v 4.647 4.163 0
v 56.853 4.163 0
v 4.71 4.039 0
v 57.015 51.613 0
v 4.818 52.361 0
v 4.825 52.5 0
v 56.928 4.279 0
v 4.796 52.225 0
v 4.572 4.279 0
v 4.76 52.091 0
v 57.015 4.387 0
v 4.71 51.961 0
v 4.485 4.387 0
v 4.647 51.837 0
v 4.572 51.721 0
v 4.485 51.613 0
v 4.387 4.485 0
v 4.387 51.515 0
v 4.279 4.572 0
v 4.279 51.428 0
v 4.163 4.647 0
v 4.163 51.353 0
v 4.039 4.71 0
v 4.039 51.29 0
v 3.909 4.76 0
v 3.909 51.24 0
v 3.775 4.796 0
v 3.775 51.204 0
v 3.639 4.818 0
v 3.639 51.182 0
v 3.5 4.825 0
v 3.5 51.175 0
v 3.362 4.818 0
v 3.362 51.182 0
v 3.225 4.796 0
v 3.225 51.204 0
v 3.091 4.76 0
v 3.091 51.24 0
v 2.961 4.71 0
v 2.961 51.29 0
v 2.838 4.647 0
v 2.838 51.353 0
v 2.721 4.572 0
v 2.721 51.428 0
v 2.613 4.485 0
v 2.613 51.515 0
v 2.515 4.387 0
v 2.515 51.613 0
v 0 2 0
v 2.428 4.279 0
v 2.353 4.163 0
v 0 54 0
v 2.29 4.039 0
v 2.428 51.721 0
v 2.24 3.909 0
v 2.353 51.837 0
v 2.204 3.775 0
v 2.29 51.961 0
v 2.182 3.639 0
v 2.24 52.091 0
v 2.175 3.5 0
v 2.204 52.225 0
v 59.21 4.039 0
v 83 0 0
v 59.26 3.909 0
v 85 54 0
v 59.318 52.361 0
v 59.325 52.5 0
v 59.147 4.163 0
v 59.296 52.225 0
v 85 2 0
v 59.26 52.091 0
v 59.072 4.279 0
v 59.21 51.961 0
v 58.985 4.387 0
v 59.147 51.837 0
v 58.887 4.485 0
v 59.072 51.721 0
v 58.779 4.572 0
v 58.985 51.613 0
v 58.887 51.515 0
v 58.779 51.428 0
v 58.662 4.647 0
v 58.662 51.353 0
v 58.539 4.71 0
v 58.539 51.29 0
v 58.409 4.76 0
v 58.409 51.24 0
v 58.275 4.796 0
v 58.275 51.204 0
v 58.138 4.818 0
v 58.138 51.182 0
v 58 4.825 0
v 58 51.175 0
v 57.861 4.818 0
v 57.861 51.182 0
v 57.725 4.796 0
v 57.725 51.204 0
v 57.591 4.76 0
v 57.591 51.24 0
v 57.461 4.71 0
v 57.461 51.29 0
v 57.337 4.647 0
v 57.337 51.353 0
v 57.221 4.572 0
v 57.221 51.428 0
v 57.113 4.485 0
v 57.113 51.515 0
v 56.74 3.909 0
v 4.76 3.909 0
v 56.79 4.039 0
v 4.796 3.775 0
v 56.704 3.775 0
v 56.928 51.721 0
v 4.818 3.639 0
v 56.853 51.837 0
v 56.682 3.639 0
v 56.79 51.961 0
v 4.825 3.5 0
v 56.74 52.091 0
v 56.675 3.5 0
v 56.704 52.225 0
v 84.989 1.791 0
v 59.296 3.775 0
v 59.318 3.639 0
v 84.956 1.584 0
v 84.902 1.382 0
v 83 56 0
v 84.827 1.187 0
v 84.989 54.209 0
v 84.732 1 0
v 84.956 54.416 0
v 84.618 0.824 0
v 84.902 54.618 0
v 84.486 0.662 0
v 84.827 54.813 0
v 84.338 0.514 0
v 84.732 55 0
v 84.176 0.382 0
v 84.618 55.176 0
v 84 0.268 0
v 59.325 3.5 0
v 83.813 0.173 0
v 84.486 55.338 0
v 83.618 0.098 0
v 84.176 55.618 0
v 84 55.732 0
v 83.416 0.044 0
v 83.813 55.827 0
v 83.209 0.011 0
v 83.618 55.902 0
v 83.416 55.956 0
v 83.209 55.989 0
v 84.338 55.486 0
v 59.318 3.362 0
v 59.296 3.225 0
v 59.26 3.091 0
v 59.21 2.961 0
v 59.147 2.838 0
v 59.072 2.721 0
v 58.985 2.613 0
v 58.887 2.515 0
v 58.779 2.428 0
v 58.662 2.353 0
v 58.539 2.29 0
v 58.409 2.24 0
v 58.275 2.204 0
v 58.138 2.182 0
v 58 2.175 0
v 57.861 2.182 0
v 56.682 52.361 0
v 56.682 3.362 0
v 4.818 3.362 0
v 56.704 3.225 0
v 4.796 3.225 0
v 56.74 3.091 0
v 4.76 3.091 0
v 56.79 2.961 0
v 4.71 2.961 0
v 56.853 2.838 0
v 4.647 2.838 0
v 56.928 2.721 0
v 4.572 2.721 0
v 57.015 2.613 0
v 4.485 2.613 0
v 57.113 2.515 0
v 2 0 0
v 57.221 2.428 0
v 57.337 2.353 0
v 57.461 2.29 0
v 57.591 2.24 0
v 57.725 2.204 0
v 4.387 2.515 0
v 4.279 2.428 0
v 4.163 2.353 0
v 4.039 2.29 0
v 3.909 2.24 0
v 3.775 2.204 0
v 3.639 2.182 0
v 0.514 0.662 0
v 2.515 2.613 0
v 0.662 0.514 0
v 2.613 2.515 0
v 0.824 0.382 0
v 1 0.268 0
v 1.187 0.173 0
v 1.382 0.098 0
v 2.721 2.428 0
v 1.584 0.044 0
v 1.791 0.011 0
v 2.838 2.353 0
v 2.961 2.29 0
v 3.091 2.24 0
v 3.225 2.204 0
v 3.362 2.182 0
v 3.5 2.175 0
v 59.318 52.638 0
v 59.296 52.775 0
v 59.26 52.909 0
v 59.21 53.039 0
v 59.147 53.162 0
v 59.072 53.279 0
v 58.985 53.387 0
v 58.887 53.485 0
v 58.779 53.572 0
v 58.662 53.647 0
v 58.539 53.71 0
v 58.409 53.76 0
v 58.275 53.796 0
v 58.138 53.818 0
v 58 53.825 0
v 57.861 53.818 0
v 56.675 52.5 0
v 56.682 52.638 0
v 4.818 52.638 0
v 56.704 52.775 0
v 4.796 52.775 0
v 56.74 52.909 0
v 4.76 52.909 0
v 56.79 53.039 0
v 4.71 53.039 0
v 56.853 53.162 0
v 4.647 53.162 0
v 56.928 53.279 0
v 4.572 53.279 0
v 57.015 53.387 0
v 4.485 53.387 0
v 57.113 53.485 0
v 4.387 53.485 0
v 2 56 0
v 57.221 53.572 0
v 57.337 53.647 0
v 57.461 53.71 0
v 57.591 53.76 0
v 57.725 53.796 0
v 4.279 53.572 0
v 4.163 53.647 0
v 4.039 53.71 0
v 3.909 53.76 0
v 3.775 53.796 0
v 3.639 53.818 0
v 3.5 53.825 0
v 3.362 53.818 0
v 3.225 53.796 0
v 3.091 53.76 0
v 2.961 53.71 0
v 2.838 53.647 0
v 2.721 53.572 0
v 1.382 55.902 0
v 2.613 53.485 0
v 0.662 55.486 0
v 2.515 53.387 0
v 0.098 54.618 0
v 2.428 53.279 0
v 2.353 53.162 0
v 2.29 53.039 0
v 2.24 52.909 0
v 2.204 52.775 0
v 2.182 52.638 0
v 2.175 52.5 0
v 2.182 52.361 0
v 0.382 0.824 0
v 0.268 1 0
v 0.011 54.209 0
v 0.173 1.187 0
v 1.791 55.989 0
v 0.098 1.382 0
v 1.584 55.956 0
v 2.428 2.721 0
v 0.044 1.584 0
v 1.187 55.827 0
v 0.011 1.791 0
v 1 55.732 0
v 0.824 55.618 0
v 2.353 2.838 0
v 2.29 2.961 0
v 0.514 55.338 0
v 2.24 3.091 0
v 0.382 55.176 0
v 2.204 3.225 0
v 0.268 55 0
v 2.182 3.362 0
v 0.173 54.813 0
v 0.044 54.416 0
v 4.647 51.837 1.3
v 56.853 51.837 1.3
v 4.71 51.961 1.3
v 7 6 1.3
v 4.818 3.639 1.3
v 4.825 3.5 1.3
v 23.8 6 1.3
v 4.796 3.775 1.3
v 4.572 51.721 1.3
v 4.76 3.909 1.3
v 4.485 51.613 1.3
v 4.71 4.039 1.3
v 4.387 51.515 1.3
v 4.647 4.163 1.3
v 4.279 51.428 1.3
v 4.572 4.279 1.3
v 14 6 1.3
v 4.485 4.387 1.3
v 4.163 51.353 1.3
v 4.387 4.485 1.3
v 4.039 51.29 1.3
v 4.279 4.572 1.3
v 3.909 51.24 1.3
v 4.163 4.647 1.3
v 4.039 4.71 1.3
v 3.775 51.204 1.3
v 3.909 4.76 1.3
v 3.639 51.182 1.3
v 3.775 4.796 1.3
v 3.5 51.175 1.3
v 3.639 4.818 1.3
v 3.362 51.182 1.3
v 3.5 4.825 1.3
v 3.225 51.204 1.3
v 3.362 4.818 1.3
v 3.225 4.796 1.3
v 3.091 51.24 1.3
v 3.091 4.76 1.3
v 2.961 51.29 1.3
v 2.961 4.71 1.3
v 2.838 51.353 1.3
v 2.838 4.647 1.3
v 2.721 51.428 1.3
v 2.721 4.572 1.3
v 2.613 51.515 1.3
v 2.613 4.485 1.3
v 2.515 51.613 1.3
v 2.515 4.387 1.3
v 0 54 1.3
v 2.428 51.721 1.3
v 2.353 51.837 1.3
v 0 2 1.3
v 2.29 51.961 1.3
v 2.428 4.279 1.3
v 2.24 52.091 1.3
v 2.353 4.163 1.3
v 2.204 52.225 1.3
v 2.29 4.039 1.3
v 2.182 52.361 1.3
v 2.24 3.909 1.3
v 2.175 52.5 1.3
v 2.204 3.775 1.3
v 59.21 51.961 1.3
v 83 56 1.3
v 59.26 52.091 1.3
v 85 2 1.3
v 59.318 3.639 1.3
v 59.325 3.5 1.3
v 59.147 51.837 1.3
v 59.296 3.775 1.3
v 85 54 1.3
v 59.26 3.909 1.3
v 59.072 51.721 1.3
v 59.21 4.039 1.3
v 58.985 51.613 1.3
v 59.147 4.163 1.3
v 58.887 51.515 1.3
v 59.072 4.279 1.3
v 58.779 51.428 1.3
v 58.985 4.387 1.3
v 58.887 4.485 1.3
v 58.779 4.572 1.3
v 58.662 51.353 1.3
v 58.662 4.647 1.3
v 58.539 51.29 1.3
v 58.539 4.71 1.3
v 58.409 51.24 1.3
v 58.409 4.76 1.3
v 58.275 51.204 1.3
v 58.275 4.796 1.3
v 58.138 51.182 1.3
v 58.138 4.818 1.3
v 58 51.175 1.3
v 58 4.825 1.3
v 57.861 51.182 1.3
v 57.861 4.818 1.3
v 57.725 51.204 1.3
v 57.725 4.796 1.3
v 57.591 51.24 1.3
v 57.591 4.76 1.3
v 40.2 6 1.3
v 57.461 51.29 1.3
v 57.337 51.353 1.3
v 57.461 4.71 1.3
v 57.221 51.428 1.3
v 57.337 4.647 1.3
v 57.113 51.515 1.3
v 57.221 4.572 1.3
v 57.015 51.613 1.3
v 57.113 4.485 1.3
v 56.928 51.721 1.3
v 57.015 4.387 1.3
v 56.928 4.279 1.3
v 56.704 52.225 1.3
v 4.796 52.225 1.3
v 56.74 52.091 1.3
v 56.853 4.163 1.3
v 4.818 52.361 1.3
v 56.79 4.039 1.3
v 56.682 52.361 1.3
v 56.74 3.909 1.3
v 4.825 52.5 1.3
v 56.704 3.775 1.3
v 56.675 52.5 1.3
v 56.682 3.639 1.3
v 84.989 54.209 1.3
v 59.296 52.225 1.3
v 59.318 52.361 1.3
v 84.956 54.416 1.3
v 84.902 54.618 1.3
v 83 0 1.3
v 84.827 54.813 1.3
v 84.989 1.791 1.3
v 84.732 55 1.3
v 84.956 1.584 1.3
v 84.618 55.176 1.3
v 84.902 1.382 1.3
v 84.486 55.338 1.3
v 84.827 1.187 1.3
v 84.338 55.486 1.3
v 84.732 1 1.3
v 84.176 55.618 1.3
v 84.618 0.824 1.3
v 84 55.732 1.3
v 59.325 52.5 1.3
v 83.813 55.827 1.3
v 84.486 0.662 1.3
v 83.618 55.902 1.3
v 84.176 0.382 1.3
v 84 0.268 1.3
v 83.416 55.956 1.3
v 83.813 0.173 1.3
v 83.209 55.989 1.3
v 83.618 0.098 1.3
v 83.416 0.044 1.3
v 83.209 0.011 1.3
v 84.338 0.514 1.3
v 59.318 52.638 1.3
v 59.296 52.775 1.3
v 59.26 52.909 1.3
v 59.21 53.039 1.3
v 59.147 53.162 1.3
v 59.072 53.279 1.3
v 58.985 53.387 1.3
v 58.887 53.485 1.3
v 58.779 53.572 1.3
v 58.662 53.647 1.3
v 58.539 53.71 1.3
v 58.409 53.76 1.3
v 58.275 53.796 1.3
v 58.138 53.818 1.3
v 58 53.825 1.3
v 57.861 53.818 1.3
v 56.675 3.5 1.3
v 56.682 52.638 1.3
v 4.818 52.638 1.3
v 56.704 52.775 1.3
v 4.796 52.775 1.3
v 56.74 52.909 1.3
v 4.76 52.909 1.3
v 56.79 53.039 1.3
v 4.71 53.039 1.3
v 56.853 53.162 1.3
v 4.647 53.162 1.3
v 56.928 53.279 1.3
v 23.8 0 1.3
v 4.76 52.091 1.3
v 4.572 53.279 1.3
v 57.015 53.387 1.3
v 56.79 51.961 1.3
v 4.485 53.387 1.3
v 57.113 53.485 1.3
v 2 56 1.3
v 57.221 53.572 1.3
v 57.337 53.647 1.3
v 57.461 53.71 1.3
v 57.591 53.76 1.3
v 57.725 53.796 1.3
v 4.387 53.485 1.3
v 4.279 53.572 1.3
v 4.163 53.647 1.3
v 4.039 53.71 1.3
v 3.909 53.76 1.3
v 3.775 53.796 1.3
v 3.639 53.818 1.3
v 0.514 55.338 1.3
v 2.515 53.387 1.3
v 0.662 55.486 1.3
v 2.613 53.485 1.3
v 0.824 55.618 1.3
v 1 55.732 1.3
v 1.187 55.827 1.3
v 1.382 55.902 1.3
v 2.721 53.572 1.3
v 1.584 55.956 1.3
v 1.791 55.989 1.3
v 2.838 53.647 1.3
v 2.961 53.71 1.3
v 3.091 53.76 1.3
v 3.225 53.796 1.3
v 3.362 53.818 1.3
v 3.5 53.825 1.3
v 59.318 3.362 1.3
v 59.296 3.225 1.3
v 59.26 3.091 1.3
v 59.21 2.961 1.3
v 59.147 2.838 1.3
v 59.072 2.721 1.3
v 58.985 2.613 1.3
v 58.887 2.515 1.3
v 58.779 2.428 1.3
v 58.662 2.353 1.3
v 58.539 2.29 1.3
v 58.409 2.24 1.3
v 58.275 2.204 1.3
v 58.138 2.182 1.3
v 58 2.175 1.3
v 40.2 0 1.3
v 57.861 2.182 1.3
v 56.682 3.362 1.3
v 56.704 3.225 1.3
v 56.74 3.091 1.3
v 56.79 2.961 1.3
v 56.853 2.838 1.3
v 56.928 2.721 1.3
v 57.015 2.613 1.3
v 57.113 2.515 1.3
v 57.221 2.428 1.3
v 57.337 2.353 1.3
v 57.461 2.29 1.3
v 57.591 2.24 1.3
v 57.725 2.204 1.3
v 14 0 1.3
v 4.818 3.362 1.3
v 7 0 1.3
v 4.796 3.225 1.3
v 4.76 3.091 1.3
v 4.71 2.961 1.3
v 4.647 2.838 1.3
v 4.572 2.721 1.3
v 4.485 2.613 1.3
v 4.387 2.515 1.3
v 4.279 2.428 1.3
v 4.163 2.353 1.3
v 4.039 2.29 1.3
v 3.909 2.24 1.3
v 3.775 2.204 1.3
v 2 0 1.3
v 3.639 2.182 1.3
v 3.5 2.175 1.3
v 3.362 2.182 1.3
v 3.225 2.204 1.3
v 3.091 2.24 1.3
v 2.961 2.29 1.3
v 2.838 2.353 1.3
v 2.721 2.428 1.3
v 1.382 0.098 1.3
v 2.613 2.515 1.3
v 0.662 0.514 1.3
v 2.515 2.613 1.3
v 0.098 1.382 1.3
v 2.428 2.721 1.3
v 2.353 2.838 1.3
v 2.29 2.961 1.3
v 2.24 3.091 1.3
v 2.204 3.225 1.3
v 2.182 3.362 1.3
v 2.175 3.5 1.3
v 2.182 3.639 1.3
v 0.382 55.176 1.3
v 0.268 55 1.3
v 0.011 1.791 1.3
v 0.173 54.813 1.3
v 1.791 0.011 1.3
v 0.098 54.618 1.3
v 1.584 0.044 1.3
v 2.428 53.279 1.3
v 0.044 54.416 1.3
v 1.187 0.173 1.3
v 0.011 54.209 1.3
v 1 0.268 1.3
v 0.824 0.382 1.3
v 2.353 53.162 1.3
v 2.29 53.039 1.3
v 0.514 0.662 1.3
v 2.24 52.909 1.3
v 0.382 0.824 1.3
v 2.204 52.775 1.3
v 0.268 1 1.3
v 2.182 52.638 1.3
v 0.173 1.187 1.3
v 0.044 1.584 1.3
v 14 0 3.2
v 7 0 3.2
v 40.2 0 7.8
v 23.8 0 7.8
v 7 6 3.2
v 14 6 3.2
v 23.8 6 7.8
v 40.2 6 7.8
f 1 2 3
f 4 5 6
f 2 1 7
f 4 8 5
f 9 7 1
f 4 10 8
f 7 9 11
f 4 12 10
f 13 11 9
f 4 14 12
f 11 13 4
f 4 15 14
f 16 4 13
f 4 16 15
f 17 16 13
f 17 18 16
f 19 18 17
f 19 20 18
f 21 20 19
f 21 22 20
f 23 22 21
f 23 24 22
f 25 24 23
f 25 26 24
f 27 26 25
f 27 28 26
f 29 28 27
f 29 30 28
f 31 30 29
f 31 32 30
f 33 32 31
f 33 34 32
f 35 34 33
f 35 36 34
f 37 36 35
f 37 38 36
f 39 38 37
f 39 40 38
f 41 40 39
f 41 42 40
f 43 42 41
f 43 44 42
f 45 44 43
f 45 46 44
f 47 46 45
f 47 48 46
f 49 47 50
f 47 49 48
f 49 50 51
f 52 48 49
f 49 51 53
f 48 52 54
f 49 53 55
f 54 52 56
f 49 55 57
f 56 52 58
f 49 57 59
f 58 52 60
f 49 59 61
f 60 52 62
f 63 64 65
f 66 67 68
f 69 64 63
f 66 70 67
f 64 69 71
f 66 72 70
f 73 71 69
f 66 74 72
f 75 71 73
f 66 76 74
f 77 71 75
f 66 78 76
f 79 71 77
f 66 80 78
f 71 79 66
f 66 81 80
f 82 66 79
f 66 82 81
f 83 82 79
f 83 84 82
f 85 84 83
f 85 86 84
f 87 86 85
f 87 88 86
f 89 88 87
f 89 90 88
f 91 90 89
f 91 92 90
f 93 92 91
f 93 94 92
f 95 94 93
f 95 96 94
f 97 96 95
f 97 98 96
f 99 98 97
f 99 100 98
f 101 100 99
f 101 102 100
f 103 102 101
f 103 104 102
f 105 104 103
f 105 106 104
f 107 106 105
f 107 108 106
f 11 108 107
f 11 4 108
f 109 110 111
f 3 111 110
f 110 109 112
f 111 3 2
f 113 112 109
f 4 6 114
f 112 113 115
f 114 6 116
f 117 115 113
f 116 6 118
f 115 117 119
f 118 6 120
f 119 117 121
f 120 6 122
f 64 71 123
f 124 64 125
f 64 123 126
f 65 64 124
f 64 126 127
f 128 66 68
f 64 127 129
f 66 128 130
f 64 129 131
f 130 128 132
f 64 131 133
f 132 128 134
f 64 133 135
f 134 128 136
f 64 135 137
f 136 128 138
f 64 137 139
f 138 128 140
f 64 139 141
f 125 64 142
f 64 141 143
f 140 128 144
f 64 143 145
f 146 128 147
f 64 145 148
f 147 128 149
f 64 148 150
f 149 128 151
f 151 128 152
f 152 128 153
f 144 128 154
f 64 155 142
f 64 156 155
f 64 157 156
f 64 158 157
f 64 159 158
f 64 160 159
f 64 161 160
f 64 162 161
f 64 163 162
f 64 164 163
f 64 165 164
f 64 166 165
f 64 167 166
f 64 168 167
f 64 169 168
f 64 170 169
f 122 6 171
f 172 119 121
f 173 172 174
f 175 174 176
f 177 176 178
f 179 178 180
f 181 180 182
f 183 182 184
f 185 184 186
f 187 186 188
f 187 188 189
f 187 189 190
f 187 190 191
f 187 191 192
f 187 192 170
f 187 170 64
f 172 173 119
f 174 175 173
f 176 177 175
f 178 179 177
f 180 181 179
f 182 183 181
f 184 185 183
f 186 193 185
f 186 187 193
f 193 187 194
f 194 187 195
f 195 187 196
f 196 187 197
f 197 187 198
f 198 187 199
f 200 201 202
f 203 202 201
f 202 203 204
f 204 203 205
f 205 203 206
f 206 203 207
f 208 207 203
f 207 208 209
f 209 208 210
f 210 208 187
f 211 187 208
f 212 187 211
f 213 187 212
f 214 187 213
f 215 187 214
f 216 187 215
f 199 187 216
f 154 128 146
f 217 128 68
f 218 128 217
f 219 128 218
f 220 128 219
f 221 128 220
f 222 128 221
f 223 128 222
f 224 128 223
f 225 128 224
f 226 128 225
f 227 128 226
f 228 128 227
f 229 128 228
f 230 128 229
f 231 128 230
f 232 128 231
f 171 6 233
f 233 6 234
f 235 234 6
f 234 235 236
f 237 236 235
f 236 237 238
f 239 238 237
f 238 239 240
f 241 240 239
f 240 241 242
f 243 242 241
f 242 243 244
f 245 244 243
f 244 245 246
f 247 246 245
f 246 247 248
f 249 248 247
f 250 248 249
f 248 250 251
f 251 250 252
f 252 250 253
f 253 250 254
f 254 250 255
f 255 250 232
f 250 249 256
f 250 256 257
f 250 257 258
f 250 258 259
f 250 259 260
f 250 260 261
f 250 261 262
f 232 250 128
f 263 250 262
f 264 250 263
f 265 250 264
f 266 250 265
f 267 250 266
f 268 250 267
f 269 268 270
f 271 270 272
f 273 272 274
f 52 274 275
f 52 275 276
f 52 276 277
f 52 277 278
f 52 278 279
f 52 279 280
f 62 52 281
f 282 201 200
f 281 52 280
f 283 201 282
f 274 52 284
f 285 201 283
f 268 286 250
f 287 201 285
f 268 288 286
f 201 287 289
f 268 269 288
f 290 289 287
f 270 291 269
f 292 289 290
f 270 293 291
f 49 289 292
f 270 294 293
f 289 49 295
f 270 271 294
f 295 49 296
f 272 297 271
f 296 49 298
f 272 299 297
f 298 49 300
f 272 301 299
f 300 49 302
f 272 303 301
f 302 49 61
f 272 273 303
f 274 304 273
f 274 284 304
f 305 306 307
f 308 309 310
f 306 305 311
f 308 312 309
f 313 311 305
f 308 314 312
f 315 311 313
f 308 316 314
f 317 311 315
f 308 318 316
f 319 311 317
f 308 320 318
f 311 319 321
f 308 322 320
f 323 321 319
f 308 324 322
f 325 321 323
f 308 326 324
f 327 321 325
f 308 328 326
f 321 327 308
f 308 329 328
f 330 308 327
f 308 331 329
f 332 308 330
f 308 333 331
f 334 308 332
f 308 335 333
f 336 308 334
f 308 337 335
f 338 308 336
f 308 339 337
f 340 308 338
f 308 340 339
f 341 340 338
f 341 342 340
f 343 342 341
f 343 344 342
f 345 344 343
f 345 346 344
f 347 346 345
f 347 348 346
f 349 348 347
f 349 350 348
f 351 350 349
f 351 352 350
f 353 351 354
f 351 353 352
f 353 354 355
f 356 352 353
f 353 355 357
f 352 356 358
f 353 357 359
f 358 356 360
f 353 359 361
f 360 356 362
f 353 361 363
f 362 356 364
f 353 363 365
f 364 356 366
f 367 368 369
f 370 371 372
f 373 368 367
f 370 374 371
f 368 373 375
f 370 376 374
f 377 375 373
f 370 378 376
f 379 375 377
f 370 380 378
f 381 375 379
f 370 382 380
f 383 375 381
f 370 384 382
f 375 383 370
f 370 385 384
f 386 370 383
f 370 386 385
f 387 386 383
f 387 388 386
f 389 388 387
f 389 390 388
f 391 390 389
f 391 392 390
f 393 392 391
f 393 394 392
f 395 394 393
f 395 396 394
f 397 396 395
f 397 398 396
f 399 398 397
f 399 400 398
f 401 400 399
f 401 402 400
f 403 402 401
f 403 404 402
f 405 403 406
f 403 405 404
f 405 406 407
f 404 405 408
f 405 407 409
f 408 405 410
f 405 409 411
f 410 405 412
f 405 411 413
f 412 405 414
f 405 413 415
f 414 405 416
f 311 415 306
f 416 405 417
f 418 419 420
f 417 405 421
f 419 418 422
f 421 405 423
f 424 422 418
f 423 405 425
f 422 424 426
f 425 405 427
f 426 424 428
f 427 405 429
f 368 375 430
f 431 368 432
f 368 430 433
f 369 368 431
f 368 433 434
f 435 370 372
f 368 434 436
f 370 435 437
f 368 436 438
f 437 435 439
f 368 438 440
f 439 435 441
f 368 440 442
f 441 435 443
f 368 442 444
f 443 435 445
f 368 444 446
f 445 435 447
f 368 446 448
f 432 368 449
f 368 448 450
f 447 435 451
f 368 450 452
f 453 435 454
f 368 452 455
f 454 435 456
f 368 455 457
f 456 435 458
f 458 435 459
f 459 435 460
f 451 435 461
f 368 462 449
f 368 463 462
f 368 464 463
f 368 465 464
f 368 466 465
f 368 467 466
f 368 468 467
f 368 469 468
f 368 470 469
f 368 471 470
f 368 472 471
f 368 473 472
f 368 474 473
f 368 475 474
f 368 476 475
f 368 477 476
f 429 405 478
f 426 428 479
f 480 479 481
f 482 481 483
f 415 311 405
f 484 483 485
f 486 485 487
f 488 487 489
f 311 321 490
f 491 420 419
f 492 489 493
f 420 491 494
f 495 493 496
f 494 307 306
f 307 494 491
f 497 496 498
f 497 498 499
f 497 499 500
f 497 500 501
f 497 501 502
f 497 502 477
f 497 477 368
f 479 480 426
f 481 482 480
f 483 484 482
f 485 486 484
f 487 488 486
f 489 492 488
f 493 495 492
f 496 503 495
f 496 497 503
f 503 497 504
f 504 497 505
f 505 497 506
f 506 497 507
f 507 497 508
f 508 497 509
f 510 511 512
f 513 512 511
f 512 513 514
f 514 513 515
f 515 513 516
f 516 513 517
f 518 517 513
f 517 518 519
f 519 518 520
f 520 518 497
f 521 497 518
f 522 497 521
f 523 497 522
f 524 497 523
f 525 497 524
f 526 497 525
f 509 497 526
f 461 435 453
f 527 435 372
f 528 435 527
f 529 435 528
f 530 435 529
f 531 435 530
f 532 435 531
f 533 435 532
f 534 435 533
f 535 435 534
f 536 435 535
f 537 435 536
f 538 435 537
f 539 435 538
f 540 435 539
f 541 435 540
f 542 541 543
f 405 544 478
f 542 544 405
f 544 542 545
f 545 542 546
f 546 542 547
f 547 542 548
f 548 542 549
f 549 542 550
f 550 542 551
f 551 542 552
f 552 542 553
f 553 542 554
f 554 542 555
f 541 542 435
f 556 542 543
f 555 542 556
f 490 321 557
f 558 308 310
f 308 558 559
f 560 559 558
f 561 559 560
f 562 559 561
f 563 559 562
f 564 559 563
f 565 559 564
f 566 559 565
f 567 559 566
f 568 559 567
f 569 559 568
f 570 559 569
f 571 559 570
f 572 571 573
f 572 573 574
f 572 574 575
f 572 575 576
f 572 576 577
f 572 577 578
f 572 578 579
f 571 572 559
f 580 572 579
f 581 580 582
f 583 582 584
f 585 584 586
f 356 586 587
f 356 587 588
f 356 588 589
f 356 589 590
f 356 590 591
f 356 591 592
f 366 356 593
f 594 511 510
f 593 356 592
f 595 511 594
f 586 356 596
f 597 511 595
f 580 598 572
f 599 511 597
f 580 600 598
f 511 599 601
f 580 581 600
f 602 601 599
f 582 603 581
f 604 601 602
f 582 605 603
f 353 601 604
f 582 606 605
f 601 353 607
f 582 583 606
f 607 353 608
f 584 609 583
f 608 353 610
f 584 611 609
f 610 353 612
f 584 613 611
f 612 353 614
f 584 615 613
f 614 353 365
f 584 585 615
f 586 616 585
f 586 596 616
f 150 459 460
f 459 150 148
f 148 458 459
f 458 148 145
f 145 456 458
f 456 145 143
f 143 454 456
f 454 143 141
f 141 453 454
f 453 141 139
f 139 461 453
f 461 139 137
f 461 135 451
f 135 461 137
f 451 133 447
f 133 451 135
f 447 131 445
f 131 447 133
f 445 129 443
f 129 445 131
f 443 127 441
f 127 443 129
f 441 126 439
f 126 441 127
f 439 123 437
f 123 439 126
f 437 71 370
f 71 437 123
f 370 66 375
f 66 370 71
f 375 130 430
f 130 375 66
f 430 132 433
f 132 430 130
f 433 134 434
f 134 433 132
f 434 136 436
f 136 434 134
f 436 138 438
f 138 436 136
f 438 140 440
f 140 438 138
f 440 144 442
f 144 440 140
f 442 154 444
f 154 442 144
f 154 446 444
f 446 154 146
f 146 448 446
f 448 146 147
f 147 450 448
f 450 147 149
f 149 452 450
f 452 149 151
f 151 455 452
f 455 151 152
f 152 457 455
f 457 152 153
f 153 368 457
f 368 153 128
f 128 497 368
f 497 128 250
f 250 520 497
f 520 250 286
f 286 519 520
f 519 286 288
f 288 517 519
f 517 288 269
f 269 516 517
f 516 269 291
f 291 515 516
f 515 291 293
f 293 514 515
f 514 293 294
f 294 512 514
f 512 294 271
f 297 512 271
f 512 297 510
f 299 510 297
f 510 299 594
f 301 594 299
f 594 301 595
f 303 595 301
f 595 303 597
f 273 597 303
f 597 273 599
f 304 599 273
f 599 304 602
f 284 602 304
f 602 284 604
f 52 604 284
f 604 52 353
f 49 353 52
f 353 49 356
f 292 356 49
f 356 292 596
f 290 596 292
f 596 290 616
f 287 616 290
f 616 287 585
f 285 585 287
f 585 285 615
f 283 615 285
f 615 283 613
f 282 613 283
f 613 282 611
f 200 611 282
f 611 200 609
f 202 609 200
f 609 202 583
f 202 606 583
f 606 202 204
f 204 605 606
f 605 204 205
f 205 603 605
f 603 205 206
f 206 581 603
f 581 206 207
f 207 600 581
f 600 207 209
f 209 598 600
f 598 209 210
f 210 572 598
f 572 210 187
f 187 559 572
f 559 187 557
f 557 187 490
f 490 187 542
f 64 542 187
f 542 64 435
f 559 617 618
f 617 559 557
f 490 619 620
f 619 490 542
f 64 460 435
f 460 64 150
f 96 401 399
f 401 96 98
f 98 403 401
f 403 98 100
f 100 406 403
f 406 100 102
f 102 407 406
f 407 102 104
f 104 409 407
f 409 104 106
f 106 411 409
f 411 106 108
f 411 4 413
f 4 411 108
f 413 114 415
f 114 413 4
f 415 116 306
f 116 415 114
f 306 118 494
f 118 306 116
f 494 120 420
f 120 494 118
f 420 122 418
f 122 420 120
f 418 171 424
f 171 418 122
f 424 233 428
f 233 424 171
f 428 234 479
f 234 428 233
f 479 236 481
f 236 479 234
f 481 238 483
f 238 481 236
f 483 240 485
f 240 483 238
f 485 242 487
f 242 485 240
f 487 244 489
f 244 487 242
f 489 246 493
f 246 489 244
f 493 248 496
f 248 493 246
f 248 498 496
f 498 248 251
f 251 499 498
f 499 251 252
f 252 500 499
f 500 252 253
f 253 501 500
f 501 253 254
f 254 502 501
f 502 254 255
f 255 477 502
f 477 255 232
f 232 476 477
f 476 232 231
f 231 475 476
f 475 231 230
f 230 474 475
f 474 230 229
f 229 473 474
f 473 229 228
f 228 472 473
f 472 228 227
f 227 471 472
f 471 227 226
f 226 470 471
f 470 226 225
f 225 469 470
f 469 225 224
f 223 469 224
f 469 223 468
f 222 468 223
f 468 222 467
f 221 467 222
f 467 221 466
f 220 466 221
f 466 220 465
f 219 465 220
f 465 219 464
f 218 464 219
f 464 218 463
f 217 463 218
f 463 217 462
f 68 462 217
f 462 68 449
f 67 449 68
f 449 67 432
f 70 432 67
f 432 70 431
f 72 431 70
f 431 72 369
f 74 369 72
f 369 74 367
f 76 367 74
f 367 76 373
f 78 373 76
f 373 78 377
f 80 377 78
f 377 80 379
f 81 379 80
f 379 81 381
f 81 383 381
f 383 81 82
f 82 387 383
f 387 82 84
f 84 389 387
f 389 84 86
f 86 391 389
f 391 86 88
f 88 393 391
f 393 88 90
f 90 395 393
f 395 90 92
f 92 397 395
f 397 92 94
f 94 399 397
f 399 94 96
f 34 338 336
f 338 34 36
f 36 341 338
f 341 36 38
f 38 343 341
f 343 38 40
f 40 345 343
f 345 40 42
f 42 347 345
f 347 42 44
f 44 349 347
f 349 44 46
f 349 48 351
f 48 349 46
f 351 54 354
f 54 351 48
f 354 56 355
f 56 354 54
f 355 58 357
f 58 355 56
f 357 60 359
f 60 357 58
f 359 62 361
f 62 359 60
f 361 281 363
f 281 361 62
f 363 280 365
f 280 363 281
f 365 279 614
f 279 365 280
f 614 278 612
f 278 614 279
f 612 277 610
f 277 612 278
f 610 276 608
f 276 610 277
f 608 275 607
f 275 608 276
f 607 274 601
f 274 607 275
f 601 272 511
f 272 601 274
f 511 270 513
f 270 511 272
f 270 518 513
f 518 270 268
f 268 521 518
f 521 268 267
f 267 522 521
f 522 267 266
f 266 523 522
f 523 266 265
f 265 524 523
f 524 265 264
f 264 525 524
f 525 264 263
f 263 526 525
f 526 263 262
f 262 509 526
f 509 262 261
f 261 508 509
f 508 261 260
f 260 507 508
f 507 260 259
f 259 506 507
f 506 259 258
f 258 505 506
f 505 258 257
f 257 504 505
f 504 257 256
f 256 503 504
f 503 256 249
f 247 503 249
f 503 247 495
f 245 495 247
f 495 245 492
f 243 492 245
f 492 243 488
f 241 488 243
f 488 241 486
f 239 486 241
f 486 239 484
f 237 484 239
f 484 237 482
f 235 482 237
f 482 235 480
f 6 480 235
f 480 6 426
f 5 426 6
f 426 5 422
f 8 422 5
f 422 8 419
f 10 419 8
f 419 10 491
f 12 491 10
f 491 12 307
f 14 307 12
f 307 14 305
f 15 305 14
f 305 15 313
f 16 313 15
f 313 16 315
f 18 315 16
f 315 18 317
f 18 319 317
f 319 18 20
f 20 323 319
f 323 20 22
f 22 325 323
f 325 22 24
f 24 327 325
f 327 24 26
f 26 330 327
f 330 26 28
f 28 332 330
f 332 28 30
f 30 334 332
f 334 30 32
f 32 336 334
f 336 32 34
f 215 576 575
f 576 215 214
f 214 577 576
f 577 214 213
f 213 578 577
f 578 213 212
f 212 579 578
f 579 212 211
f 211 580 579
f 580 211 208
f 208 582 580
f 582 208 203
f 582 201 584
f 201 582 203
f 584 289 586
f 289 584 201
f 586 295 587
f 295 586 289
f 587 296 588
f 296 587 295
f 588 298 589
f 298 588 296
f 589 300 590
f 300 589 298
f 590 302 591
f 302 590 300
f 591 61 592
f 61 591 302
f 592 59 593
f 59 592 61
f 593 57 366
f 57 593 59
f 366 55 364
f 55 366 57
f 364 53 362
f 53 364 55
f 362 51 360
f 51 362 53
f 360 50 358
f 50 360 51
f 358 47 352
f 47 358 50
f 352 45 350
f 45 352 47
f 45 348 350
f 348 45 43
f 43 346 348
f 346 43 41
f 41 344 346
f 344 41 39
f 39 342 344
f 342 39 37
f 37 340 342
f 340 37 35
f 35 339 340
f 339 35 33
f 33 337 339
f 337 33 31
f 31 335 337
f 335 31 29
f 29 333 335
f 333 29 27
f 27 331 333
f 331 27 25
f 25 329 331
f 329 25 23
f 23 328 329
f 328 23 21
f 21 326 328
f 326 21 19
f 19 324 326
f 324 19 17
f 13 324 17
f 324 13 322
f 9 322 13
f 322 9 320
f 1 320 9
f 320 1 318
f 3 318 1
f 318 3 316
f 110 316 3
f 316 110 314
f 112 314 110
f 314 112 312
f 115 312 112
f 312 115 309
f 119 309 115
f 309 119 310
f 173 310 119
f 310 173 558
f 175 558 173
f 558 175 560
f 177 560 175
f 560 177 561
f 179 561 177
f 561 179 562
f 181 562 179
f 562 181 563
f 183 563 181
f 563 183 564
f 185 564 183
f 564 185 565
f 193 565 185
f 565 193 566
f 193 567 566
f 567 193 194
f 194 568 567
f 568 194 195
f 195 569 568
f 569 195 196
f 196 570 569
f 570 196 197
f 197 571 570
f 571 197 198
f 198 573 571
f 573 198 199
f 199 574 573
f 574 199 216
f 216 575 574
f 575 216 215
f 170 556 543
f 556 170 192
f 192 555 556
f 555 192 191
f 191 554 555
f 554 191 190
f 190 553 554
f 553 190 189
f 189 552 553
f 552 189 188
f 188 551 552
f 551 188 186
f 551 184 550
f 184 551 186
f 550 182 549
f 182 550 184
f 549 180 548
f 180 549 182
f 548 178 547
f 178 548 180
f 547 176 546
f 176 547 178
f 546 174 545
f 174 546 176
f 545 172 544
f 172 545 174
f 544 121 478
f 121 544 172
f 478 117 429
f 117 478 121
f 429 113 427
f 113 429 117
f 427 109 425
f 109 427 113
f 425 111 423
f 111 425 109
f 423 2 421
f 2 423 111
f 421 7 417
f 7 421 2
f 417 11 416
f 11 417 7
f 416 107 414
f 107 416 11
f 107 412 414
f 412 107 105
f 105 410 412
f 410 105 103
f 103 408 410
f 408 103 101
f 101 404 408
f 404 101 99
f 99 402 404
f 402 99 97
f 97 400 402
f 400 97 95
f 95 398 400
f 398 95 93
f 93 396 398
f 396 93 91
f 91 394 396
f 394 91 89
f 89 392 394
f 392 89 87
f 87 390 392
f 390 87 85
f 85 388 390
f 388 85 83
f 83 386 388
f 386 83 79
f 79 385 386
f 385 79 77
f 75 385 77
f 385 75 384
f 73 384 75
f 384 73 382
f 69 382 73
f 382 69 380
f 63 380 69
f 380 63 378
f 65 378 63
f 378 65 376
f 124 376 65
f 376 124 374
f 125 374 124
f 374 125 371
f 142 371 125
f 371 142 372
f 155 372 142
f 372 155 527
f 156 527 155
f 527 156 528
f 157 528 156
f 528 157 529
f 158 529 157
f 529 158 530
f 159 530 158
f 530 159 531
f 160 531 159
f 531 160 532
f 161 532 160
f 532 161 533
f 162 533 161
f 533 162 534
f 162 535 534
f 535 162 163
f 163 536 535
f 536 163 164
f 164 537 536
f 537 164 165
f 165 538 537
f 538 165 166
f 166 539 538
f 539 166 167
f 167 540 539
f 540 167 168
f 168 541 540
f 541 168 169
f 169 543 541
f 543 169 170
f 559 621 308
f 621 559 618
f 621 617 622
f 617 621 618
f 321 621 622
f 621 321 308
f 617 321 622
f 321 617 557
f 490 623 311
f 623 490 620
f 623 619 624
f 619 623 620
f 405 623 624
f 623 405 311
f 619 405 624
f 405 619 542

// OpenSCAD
// Libre Computer Board Case
$fn=60;
board_len = 85.0;
board_wid = 56.0;
board_thick = 1.3;
rounding_len = 2;
screw_dia = 2.65;
screw_offset = 3.5;
mid_screw_dist = 61.5-(board_len/2);

micro_usb_wid = 7.0;
micro_usb_ht = 1.9;
micro_usb_offset = 10.5; // From corner

hdmi_wid = 16.4;
hdmi_ht = 6.5;
hdmi_offset = 32.0; // From corner

module wantRect(l, w) {
    translate([-l/2,-w/2,0])
    square([l, w]);
}

module wantCirc(r) {
    circle(r);
}

module boardBody() {
    offset(rounding_len) offset(-rounding_len)
    wantRect(board_len, board_wid);
}

module screwHoles() {
    translate([mid_screw_dist-screw_offset, board_wid/2-screw_offset]) 
    wantCirc(screw_dia/2);
    translate([-(board_len/2-screw_offset), board_wid/2-screw_offset]) 
    wantCirc(screw_dia/2);
    translate([-(board_len/2-screw_offset), -(board_wid/2-screw_offset)]) 
    wantCirc(screw_dia/2);
    translate([mid_screw_dist-screw_offset, -(board_wid/2-screw_offset)]) 
    wantCirc(screw_dia/2);
}

module screwHoleBoard() {
    difference() {
        boardBody();
        screwHoles();
    }
}


module screwHoleBoard3D() {
    linear_extrude(board_thick) 
    screwHoleBoard();
}

module microUSBPort() {
    translate([micro_usb_offset, 3.0, board_thick])
    linear_extrude(micro_usb_ht)
    wantRect(micro_usb_wid, 6.0);
}

module hdmiPort() {
    translate([hdmi_offset, 3.0, board_thick])
    linear_extrude(hdmi_ht)
    wantRect(hdmi_wid, 6.0);
}


translate([board_len/2, board_wid/2])
screwHoleBoard3D();
#microUSBPort();
#hdmiPort();
